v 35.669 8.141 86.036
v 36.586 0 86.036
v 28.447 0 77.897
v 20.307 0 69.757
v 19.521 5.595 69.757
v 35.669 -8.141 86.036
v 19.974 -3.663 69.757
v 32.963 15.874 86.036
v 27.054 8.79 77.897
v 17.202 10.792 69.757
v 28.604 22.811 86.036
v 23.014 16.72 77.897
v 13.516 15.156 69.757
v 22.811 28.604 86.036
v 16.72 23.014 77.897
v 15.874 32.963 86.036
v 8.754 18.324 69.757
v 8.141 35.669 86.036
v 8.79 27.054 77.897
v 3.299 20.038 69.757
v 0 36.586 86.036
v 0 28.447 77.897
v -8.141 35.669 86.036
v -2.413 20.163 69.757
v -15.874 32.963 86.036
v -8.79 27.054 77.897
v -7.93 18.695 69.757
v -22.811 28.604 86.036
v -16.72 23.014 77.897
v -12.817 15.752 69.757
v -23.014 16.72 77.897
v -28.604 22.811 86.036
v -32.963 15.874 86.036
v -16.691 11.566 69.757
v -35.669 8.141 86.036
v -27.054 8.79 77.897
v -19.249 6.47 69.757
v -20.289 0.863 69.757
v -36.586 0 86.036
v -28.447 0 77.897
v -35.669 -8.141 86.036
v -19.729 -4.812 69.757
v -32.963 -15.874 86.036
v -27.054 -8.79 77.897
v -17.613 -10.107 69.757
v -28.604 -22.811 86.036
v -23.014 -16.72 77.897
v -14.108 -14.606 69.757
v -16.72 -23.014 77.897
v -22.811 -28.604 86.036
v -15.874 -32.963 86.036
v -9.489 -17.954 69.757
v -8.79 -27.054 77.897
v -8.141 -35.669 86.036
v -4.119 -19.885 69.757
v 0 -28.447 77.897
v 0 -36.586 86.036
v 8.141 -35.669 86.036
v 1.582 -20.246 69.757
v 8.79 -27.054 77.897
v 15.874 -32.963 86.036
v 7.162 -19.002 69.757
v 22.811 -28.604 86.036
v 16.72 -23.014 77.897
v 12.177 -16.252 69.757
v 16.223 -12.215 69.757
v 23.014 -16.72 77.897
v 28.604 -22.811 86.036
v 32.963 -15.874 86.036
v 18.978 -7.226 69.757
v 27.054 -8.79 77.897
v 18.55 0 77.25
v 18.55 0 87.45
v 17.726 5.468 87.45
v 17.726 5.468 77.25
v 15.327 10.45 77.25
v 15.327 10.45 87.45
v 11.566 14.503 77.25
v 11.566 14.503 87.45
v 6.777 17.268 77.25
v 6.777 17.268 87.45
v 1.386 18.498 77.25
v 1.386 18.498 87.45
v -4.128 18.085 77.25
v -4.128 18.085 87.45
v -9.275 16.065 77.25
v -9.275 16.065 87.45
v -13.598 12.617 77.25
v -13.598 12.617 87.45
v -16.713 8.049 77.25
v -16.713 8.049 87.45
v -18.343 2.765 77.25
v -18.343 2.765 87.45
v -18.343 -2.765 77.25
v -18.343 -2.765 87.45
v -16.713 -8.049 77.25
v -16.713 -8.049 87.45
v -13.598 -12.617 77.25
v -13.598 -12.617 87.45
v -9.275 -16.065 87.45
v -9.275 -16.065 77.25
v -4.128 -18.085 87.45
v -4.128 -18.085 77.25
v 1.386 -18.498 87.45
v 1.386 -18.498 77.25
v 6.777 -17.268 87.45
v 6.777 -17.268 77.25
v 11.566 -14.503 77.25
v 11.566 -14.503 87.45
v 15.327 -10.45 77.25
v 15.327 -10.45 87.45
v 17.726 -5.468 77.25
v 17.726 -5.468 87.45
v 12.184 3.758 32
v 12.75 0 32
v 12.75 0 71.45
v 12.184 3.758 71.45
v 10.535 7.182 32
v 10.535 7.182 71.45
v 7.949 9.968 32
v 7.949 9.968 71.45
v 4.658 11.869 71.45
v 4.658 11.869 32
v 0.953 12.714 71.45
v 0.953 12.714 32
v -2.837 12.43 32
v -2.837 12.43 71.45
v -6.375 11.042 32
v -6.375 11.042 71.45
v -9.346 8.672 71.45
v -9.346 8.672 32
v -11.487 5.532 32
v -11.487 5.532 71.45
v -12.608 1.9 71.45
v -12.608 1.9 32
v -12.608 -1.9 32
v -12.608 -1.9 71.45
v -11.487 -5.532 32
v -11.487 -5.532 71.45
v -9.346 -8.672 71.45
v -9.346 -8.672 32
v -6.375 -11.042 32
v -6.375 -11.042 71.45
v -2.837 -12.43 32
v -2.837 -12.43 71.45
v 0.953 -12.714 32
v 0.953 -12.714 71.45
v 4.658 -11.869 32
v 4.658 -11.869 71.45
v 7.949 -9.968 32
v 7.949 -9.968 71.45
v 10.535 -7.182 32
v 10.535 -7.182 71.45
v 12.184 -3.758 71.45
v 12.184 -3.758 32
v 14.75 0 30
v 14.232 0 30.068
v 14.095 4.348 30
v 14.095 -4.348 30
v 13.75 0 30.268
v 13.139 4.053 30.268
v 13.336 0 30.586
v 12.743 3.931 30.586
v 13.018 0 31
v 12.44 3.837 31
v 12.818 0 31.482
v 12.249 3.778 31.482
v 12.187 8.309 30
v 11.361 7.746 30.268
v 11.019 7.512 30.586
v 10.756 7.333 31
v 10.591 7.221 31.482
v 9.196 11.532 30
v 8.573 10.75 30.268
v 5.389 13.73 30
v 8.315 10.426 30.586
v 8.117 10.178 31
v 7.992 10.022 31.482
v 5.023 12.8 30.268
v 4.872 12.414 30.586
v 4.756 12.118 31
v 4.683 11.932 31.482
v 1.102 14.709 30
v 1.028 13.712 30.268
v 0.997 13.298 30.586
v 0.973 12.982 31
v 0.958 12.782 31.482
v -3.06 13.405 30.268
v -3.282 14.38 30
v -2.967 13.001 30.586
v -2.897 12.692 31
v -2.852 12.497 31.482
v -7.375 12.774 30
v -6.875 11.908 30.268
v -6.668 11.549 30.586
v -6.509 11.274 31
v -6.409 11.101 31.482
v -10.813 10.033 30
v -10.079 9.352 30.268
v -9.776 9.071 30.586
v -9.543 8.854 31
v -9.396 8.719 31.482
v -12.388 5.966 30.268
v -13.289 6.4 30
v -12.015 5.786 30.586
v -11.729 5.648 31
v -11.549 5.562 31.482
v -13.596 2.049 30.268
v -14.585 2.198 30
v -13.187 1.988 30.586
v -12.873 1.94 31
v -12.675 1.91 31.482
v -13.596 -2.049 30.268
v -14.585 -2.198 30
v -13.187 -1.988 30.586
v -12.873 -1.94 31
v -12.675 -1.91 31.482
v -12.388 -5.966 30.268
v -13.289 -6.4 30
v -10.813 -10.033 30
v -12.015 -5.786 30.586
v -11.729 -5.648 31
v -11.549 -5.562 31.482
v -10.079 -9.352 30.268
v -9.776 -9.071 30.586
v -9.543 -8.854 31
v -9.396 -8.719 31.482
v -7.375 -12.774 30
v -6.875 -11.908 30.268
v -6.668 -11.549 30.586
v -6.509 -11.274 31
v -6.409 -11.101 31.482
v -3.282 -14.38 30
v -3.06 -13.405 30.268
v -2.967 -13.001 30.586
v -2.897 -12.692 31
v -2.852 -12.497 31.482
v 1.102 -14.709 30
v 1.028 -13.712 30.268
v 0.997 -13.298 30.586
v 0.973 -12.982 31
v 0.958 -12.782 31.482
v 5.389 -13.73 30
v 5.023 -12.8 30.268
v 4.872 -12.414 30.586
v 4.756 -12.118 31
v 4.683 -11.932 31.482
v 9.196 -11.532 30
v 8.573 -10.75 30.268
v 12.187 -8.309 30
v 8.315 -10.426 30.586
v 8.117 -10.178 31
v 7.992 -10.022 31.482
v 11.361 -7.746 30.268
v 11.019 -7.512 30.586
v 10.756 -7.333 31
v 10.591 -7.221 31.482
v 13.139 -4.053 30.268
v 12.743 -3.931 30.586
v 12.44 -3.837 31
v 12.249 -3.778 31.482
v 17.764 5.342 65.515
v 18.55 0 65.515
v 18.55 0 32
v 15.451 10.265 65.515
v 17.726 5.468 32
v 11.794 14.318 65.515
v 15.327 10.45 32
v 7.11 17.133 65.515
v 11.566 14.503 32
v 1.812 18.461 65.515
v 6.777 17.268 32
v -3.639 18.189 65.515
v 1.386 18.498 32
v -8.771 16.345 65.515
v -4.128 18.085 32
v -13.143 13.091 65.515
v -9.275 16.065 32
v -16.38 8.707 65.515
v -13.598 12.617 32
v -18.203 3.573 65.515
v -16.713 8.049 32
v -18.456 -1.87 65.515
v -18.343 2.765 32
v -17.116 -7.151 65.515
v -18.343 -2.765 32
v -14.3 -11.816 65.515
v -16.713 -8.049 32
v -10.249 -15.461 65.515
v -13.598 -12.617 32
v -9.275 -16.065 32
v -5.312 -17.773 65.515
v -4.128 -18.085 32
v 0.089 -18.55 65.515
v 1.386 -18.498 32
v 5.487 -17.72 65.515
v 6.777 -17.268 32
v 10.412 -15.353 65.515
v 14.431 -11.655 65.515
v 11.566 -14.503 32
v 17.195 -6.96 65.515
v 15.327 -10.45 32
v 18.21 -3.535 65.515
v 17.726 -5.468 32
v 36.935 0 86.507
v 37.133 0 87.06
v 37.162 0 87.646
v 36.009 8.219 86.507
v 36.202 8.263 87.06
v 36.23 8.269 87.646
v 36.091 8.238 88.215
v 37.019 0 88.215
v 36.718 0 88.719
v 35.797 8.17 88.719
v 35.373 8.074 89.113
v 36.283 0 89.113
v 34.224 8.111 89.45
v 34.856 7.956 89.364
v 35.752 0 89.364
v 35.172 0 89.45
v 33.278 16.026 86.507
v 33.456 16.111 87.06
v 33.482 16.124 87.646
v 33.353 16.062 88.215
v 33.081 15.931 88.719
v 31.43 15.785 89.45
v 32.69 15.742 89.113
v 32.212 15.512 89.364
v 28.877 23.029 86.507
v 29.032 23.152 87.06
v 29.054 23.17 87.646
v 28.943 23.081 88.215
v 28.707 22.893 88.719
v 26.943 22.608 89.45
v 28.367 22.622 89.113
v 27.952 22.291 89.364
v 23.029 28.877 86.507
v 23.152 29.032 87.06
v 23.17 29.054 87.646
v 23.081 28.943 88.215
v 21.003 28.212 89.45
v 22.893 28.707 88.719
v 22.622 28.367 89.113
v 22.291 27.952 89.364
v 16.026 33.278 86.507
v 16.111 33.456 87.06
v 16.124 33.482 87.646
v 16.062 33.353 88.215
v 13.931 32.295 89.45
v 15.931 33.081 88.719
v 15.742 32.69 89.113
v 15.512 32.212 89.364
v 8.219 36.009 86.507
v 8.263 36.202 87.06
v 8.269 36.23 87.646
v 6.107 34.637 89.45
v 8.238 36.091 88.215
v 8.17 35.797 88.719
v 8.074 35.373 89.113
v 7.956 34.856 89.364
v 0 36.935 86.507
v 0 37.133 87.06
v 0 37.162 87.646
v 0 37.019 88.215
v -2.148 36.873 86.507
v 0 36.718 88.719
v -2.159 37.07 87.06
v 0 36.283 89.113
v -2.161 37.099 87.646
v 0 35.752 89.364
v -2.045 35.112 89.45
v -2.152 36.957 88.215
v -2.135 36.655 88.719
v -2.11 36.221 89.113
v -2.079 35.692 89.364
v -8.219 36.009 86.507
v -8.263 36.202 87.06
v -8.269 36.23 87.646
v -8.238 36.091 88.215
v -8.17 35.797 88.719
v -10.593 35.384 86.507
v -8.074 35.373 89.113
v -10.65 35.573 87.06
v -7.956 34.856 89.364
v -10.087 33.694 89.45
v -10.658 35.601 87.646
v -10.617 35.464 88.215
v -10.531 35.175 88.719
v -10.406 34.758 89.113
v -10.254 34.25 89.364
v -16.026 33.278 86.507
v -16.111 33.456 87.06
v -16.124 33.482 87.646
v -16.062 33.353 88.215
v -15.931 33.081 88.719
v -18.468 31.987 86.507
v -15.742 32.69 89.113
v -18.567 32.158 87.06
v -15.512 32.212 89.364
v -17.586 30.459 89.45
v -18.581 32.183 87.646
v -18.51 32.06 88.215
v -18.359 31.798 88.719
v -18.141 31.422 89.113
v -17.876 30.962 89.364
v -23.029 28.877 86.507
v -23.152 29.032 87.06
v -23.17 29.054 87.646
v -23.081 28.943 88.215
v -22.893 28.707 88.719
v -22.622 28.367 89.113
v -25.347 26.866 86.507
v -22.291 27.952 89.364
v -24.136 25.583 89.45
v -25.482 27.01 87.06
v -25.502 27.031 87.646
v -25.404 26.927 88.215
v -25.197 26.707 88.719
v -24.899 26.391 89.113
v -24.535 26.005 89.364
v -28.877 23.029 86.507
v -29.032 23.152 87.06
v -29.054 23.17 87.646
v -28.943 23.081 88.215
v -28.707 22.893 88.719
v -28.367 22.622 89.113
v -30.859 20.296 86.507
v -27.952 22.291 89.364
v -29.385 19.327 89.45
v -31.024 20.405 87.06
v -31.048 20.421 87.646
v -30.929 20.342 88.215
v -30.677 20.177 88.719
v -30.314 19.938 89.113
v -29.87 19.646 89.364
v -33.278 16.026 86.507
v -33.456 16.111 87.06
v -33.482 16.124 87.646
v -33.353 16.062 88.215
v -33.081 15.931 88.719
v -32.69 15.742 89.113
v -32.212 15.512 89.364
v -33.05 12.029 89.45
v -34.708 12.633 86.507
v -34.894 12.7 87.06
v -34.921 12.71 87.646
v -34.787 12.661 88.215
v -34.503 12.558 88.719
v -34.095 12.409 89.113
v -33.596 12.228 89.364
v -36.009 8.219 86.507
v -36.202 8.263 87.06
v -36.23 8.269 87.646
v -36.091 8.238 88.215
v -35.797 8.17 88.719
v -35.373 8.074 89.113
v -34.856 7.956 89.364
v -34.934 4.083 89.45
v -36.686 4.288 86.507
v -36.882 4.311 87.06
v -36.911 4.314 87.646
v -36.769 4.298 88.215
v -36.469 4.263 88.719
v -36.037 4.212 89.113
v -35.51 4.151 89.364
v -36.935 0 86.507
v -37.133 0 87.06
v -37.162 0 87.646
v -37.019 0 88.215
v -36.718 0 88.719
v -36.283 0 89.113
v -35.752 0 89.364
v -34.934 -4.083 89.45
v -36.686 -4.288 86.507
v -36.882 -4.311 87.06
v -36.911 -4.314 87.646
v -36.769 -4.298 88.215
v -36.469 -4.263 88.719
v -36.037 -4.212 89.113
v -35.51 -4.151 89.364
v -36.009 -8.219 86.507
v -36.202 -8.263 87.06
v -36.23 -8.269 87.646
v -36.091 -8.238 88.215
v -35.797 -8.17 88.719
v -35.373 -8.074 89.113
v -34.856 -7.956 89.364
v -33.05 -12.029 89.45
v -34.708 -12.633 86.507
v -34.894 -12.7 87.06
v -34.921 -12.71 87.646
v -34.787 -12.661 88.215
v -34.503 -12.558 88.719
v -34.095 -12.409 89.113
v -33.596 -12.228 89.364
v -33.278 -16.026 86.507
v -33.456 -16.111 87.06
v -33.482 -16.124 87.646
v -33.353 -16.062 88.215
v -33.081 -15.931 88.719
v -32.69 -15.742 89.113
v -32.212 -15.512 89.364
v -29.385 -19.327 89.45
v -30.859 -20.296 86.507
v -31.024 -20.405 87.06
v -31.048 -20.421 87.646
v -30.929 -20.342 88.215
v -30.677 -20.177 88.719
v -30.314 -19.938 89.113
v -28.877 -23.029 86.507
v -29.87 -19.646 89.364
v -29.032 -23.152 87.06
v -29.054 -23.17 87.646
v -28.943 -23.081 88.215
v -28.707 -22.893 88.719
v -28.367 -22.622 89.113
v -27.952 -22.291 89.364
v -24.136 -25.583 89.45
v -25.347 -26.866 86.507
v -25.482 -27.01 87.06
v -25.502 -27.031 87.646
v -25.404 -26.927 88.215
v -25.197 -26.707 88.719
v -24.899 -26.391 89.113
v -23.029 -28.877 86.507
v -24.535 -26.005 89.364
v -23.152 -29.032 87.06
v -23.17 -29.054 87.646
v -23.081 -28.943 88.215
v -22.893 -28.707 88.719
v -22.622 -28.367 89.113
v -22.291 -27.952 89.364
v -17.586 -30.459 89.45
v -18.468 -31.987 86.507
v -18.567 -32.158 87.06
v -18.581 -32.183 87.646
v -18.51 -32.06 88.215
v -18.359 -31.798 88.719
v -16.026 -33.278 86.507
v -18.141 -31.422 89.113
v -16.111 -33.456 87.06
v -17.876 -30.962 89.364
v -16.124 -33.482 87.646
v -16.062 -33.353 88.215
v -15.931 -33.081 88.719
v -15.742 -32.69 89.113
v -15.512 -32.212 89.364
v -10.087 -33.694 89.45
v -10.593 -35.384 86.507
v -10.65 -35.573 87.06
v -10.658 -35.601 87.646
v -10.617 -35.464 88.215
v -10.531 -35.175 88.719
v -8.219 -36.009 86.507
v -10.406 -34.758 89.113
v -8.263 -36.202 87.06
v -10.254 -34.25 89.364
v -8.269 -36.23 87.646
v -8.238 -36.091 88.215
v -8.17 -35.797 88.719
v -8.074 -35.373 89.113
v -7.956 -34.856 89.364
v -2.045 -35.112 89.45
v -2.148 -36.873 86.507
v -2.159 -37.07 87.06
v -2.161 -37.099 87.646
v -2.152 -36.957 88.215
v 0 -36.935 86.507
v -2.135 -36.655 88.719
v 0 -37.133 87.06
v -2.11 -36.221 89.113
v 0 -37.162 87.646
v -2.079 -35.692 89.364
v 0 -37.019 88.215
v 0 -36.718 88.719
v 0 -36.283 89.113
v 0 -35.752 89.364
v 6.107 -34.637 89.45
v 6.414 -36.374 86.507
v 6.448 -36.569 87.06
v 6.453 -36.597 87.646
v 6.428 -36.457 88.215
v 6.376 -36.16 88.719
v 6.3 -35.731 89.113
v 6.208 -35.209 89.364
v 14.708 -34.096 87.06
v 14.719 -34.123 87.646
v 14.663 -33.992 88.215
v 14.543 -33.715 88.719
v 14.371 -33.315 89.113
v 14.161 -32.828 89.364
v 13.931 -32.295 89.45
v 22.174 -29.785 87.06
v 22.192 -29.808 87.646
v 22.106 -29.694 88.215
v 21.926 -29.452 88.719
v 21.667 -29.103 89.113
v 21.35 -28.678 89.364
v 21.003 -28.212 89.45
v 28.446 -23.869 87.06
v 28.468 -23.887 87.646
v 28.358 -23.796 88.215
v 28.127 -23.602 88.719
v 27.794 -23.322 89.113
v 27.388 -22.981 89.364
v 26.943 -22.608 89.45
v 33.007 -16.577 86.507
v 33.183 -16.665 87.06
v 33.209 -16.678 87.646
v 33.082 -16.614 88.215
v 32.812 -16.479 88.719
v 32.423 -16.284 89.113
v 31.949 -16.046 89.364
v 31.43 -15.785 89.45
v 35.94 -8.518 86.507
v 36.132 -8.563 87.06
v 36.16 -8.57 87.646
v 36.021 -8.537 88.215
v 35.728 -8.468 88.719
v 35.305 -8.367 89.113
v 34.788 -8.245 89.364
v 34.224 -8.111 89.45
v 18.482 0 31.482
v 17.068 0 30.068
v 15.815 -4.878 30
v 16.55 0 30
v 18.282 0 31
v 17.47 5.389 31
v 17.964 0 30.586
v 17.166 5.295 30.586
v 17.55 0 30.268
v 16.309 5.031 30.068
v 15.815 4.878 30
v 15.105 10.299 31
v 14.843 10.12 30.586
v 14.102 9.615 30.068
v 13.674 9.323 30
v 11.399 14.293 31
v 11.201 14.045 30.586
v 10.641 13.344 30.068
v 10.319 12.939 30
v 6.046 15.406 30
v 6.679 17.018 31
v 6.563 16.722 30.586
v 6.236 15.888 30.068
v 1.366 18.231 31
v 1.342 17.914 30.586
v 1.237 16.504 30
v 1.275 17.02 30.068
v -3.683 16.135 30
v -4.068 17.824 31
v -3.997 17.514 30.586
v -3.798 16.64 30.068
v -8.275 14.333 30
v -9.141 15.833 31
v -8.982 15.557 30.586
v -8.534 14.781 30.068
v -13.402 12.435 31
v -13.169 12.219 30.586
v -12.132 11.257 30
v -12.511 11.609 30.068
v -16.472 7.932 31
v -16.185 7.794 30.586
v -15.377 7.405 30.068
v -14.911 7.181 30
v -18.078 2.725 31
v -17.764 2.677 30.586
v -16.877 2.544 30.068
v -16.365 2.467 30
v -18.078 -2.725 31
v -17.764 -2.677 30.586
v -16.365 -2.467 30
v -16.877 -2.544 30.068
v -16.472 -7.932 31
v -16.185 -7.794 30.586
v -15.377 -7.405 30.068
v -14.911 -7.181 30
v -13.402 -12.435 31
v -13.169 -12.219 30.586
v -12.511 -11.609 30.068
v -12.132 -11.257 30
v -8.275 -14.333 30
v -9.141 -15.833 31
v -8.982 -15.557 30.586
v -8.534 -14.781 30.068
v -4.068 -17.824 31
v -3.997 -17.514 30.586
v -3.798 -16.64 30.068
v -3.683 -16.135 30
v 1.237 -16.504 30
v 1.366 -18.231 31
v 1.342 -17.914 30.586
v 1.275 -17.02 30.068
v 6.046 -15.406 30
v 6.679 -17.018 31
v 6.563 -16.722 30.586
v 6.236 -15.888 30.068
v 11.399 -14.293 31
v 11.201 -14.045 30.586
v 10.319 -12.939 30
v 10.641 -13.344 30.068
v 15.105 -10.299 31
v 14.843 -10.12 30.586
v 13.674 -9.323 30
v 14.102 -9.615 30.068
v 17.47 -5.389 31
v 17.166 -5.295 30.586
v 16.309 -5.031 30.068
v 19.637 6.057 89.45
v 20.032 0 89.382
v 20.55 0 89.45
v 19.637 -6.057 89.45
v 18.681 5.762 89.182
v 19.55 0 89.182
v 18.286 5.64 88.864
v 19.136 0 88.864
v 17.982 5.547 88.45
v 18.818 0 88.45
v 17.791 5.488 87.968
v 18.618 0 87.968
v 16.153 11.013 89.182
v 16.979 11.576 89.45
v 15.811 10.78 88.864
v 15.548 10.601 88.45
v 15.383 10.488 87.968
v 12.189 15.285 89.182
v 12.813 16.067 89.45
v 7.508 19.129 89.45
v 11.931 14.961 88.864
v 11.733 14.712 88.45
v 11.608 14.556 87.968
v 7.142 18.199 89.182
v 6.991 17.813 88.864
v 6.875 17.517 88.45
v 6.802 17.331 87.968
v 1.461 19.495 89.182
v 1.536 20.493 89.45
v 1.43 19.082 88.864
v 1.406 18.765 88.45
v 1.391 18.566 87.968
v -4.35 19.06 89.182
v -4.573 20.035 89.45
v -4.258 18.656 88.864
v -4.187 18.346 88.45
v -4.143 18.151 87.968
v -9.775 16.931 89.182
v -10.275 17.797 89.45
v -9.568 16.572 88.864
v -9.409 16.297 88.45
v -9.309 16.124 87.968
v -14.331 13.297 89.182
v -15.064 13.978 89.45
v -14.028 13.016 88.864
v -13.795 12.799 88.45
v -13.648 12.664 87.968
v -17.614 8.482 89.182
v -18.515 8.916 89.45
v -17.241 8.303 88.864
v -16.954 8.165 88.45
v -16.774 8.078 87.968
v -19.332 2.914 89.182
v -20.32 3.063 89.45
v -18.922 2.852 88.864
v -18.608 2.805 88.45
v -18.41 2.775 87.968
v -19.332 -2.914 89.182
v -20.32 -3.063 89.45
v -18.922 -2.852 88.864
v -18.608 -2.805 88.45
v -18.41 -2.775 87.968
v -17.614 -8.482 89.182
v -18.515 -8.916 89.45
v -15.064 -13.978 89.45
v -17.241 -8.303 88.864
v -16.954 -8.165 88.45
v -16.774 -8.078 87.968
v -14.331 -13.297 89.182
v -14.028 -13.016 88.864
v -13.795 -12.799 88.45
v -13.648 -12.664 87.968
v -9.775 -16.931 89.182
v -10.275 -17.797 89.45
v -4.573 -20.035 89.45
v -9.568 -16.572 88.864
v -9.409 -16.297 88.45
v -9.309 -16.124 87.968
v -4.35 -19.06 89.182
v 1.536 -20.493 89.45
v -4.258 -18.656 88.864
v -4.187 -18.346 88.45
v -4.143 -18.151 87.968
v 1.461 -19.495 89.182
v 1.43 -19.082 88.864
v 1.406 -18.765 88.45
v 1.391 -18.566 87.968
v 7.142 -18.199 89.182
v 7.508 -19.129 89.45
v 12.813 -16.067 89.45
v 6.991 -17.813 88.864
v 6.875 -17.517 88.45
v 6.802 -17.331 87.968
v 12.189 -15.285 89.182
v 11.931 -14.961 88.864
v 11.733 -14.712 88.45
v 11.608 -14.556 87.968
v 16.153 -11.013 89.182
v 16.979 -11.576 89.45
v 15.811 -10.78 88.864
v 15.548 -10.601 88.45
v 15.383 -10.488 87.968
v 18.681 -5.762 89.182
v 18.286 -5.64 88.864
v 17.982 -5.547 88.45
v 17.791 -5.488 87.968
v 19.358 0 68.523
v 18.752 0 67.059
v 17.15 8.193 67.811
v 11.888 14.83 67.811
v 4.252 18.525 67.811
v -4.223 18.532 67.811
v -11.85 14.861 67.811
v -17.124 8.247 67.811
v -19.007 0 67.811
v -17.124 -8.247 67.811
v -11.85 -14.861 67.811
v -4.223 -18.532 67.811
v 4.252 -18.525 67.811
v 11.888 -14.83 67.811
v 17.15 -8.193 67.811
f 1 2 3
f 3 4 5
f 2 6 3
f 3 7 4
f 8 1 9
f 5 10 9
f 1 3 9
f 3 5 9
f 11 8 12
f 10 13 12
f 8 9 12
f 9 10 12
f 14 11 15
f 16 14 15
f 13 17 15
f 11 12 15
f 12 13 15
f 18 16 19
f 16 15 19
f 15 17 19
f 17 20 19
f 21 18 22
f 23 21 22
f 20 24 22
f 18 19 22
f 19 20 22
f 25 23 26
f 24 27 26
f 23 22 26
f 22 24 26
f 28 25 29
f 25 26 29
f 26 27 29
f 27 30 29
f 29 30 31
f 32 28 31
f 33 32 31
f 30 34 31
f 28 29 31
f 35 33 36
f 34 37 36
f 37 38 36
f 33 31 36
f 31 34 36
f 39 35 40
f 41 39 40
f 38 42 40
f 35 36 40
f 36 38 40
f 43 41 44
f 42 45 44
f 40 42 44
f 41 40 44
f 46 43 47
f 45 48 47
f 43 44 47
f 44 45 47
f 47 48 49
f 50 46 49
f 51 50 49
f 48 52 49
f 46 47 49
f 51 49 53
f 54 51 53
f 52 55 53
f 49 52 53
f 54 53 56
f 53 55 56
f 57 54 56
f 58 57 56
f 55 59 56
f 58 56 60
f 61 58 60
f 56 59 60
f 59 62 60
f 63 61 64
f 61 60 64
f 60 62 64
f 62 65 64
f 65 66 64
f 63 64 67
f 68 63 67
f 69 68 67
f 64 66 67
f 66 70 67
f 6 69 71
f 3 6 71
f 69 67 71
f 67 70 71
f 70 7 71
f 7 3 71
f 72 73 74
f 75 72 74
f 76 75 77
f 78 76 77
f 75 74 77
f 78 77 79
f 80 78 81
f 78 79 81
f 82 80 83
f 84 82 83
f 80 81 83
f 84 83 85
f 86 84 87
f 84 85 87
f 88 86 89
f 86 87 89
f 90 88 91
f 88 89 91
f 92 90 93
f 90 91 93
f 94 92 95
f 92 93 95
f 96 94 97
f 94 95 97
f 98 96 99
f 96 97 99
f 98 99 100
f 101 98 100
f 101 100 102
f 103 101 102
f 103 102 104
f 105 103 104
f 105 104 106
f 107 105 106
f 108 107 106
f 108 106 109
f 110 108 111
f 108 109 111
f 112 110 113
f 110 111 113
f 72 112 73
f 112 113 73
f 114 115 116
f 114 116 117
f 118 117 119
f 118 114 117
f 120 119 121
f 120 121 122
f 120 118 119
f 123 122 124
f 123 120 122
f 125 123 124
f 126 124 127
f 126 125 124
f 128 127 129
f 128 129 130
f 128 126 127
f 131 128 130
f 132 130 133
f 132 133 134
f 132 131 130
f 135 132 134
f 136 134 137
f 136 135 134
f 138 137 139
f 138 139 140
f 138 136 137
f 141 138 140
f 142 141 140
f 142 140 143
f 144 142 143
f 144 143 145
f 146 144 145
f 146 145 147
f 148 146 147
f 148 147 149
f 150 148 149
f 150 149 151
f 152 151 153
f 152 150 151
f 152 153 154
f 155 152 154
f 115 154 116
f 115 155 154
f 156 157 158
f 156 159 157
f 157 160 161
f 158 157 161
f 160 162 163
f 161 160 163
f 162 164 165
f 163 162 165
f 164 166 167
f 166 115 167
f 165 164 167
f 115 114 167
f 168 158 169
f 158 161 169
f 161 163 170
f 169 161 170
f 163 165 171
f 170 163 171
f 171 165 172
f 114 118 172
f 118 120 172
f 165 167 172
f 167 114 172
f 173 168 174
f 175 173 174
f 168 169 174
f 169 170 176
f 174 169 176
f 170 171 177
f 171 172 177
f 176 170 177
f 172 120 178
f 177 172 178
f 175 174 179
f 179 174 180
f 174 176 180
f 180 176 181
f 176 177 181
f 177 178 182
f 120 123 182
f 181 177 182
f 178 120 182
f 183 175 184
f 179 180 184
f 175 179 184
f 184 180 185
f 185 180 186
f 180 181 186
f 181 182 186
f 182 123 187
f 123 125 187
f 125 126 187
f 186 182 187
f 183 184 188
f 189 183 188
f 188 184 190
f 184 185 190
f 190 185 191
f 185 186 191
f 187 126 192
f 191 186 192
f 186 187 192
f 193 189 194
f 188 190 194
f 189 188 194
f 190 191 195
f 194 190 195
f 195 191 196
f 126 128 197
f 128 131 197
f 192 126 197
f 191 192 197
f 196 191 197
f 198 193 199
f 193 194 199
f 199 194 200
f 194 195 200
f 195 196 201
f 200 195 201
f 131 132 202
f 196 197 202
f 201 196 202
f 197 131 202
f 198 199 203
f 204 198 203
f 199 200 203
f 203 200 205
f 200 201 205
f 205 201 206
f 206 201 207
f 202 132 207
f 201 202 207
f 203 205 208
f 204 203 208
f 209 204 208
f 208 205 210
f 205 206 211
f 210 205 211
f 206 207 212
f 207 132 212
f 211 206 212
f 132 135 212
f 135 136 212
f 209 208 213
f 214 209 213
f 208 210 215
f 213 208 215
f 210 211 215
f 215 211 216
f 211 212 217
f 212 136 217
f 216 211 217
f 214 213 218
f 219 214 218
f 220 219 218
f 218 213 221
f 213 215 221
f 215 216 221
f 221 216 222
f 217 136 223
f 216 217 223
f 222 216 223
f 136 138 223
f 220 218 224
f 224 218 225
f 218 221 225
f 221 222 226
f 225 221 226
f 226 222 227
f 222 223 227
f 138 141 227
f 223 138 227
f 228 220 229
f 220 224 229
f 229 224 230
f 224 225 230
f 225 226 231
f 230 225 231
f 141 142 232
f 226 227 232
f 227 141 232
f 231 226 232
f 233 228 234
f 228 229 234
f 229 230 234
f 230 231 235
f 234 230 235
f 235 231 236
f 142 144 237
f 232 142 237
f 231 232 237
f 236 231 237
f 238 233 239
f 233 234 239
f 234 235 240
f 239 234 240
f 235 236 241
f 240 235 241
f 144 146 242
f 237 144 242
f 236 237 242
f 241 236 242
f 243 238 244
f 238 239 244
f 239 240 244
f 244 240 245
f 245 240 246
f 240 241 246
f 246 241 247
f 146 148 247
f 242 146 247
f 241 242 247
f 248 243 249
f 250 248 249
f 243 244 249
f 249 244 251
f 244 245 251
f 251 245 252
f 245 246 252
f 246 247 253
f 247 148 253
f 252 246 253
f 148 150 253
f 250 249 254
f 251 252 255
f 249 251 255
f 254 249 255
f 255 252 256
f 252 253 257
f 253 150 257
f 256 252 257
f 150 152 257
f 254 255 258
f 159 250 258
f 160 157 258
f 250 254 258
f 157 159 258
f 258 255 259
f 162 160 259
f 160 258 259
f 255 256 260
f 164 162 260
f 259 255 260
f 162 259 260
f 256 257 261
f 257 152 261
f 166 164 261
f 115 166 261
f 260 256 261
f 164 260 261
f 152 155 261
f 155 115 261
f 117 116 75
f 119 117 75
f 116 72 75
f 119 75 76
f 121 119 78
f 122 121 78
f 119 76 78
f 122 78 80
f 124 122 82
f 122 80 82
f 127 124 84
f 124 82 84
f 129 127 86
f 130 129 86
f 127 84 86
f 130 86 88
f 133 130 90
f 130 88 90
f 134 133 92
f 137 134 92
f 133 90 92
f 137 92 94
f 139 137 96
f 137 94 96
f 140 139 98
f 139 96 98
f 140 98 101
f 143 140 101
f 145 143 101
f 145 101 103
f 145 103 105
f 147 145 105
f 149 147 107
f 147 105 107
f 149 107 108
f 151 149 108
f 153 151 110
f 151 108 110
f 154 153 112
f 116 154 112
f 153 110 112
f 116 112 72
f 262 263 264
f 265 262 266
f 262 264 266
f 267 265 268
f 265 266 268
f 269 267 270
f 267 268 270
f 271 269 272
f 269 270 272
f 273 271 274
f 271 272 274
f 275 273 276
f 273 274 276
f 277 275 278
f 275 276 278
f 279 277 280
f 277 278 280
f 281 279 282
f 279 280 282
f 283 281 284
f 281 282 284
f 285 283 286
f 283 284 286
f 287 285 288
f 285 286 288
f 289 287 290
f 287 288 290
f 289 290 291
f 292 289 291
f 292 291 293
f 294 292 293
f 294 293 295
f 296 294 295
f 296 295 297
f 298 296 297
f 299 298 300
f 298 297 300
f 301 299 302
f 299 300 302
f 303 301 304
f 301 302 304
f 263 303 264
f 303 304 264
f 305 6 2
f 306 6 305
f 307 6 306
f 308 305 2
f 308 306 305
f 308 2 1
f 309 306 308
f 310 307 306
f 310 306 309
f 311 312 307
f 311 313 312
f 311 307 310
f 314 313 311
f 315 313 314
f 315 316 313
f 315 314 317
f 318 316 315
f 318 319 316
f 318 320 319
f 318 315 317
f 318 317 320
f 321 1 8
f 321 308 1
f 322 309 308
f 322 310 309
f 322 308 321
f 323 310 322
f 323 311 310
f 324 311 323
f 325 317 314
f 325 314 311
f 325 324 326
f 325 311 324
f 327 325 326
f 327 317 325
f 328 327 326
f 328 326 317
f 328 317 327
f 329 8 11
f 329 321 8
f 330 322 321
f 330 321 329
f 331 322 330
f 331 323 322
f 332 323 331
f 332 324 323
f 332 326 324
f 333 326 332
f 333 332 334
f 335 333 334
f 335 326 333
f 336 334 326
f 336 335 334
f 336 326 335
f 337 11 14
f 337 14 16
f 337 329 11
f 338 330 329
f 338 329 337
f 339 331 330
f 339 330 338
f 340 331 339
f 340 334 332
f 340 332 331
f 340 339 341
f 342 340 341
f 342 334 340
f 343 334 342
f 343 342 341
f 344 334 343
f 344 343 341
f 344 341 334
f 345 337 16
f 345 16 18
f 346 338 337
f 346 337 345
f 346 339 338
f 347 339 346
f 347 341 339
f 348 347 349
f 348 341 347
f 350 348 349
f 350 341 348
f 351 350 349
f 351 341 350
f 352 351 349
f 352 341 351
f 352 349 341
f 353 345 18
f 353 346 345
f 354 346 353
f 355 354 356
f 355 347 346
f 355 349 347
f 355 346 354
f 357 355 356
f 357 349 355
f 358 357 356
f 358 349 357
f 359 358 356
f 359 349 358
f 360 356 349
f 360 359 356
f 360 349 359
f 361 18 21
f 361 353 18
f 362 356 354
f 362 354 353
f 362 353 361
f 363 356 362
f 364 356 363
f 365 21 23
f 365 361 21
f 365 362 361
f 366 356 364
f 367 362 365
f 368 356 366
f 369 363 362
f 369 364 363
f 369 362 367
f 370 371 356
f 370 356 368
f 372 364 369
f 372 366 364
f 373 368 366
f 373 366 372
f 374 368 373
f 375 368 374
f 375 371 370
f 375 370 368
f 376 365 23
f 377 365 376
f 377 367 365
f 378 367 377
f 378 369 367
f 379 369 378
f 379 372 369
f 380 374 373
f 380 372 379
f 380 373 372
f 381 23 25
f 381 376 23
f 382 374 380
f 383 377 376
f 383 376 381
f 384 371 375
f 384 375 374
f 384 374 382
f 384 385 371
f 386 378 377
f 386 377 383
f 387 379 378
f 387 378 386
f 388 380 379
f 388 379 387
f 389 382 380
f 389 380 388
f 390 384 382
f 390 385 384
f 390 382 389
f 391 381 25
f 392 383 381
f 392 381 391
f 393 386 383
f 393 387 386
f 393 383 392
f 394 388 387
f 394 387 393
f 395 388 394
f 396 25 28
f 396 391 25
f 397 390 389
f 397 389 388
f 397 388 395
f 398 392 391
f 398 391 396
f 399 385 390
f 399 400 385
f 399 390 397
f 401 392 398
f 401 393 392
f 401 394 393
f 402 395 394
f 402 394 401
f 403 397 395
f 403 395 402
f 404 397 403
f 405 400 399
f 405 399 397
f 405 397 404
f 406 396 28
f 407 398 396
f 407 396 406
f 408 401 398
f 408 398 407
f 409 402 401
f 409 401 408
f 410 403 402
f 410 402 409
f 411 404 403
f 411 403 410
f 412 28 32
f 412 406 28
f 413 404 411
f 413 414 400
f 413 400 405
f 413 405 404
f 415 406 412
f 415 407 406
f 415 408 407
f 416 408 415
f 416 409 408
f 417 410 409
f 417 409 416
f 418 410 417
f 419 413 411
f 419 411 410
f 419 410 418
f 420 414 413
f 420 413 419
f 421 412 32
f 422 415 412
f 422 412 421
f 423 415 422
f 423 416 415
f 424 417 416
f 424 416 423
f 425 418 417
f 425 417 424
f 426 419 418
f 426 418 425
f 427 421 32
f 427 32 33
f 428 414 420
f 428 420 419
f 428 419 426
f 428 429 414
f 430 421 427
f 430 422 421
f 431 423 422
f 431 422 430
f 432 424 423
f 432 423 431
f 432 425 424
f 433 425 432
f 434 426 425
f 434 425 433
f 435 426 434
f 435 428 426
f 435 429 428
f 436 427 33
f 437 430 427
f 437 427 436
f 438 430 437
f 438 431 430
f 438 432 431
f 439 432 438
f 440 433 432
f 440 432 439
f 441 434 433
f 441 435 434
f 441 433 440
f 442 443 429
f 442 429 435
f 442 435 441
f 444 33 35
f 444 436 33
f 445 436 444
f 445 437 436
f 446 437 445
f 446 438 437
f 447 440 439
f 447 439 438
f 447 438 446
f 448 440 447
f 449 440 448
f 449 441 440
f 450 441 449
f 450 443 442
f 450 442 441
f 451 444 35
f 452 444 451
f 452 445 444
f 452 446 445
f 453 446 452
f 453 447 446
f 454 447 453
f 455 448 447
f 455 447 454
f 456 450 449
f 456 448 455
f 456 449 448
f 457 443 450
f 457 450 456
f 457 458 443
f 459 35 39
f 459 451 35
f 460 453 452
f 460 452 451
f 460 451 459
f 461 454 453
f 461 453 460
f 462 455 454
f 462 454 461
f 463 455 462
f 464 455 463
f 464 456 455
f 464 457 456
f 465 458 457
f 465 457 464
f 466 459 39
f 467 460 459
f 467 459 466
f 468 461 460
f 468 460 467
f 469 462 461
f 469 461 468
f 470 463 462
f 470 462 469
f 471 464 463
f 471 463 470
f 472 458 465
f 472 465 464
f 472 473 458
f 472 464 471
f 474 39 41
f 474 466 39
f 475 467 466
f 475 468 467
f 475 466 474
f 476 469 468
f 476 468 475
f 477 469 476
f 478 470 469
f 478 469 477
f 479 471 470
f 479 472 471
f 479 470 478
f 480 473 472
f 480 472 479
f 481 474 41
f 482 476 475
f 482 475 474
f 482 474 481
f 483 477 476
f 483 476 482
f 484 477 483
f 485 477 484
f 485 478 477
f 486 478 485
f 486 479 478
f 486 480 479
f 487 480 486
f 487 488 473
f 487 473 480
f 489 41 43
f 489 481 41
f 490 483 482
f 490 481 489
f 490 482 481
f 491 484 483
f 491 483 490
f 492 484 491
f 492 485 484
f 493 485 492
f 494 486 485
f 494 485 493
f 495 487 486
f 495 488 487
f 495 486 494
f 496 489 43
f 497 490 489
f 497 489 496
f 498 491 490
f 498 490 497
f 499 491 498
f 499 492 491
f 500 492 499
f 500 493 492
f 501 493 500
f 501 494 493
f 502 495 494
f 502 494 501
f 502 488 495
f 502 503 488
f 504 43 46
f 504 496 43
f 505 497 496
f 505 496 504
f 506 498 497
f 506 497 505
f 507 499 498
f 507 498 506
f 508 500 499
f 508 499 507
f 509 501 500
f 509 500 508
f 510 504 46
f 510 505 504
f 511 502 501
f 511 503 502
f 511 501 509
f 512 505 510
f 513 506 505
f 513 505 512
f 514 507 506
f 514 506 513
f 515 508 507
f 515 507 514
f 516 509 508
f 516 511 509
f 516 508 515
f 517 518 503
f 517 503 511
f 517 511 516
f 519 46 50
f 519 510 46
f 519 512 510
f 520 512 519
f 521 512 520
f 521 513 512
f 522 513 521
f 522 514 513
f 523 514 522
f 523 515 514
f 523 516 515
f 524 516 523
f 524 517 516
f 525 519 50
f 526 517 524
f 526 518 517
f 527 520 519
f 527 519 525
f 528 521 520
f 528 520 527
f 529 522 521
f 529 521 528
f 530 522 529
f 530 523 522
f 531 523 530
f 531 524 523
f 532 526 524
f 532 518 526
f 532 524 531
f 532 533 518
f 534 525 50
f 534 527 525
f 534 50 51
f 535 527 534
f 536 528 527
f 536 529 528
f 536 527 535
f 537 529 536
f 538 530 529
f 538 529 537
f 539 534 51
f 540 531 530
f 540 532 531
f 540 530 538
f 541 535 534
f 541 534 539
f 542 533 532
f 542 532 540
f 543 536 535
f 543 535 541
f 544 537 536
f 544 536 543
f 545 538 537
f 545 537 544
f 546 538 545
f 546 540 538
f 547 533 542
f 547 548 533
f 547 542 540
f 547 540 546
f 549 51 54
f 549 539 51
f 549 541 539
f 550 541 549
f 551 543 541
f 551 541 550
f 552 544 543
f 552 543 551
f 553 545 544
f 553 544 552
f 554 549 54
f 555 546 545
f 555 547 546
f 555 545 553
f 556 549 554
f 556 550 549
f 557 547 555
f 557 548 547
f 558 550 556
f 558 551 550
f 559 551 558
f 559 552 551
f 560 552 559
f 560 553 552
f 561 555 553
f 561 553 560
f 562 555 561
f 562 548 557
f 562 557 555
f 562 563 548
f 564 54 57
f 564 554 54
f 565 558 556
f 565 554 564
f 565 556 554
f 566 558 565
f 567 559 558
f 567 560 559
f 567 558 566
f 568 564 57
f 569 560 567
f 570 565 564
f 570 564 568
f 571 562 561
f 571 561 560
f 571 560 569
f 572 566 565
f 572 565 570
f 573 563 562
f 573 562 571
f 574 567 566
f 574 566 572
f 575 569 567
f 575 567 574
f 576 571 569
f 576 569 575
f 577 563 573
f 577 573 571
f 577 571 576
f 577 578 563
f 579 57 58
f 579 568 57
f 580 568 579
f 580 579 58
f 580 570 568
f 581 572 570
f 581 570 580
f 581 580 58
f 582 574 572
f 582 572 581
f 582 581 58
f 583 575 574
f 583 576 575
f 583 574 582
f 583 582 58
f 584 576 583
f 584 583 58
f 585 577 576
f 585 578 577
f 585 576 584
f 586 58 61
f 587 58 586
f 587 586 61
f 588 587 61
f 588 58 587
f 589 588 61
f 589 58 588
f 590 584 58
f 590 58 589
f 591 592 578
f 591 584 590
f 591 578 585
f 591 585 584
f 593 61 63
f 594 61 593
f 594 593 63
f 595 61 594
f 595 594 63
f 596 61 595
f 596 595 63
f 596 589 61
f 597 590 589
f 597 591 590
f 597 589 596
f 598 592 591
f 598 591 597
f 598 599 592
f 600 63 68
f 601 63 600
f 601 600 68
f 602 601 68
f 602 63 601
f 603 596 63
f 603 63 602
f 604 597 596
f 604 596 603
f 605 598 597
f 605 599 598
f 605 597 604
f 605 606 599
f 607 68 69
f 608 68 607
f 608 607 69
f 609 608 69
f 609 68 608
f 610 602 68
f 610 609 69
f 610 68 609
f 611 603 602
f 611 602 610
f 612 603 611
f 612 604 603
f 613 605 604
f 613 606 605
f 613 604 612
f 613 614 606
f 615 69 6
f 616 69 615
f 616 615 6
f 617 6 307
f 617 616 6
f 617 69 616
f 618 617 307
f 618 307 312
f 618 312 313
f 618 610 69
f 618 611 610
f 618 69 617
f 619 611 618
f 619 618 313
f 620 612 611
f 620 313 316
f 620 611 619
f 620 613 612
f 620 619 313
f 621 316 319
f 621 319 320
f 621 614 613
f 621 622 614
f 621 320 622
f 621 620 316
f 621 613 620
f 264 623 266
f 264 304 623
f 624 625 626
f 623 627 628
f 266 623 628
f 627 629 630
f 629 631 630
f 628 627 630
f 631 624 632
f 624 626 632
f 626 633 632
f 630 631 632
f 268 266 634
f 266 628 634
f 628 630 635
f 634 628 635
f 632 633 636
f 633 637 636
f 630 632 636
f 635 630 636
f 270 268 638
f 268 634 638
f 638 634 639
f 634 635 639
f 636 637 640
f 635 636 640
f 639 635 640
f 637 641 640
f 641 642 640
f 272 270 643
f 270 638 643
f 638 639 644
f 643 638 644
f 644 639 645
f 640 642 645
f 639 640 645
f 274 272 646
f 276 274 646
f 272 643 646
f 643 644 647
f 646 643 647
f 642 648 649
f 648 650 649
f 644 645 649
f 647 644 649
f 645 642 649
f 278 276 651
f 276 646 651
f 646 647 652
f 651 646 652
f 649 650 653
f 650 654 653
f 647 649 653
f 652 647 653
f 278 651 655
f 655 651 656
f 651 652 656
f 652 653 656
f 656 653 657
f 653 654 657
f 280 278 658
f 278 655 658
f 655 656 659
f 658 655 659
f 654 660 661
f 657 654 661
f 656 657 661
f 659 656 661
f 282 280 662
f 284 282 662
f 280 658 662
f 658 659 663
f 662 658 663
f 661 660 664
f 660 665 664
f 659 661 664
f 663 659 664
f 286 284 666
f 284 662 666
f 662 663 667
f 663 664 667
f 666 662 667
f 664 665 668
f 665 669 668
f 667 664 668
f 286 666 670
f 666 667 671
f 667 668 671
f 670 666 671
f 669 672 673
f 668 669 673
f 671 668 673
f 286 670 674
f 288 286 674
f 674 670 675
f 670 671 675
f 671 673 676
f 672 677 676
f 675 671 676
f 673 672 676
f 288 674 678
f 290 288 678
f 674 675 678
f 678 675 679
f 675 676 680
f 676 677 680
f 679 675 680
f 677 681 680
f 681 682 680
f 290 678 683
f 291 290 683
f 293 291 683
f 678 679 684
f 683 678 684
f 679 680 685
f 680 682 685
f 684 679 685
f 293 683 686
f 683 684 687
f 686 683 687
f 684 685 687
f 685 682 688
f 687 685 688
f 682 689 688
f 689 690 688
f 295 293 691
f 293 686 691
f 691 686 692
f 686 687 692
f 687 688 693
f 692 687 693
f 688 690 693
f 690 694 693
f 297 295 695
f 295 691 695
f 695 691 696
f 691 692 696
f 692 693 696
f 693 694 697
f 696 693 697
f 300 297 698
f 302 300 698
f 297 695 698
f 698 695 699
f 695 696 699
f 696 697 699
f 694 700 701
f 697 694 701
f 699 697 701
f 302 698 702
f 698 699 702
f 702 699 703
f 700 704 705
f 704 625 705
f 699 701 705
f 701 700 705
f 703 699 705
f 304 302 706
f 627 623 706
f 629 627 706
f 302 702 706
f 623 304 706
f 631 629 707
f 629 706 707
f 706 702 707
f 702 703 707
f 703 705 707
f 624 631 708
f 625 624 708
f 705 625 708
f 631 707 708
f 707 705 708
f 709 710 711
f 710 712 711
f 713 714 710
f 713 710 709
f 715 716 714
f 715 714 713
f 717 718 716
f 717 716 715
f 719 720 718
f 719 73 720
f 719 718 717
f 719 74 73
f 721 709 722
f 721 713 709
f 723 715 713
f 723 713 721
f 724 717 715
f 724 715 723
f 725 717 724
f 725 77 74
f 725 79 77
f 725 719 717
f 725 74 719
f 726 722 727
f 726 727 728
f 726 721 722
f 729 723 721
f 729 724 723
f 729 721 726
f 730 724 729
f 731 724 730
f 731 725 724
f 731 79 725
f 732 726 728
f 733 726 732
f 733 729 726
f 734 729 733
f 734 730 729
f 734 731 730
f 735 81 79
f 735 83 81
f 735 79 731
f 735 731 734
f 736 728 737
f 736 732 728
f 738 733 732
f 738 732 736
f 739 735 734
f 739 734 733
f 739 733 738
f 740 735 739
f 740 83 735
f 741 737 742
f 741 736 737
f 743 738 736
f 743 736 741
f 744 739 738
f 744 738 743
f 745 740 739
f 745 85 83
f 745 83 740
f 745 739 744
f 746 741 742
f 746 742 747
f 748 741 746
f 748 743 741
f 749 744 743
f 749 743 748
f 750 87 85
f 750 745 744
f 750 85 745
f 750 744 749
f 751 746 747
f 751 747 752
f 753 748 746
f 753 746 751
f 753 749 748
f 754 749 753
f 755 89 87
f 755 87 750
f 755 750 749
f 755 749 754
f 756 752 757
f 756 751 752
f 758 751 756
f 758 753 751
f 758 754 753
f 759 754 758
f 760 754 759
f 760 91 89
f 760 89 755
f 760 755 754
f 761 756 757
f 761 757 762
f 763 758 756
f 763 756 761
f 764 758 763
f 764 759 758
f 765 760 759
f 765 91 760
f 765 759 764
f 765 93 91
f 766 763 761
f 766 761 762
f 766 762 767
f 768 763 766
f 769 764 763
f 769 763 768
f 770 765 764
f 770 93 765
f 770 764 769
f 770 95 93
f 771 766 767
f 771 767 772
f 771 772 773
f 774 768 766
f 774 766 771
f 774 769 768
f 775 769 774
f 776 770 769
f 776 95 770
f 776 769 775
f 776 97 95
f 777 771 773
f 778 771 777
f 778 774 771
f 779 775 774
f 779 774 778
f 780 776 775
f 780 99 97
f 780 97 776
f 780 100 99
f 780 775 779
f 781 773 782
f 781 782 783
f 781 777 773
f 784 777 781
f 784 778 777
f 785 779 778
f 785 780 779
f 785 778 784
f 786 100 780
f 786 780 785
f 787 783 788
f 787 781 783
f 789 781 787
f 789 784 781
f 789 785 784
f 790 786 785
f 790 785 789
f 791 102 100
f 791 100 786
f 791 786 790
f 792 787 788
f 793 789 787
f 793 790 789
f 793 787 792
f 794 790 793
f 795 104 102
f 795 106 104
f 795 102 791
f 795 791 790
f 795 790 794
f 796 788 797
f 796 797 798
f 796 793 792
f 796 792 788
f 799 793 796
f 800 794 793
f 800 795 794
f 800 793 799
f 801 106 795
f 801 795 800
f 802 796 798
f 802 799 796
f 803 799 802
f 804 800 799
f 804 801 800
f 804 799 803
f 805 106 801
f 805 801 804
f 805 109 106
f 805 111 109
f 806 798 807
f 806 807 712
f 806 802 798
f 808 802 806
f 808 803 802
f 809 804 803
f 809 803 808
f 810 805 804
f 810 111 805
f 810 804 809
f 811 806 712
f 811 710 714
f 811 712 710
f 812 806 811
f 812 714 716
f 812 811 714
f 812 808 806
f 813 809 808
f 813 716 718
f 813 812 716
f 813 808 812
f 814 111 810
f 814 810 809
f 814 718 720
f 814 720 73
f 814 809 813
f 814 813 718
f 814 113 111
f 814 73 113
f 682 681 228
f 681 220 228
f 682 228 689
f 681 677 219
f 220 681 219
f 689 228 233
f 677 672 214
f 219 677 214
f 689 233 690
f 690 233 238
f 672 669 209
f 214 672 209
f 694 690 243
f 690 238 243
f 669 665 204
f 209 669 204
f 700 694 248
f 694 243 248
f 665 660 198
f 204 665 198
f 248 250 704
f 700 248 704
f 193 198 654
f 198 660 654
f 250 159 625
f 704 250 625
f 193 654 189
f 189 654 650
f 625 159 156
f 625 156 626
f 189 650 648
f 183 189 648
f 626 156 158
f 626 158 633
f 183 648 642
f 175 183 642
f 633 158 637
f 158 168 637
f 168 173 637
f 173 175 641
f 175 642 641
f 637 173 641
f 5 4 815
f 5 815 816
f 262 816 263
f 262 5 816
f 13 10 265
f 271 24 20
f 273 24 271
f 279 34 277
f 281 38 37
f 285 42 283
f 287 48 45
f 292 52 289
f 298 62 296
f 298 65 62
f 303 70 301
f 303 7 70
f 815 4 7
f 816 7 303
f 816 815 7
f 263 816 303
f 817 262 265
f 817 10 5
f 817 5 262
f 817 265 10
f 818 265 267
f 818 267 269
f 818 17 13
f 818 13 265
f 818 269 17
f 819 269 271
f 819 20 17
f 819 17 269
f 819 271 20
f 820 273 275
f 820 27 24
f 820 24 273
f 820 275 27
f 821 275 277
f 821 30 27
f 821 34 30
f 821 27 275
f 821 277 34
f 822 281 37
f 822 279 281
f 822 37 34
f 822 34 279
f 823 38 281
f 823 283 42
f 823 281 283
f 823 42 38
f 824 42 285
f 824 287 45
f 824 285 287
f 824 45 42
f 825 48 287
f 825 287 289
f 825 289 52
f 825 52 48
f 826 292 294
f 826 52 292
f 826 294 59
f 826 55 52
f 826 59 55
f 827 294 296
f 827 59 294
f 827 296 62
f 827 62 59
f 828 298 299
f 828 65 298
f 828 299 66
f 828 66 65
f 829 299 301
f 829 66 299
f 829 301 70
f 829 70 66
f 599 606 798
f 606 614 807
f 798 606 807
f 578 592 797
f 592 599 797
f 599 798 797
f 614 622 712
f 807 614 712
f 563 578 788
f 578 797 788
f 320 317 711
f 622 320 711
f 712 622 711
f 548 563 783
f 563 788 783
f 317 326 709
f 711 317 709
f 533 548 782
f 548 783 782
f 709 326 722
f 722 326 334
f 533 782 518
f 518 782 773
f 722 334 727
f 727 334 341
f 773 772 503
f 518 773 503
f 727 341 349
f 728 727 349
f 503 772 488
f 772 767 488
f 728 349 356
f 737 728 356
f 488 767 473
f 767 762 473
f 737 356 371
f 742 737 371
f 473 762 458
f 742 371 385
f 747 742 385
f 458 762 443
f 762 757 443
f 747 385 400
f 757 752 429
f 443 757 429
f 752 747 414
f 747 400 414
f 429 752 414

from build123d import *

# Parameters (mm, degrees)
FILLET_R    = 6
FILLET002_R = 2


with BuildPart() as part:
    # Sketch003 → Revolution002 (revolve)
    with BuildSketch(Plane.XZ):
        Polygon((12.75, 30), (12.75, 68), (12.75, 71.45), (18.55, 77.25), (18.55, 89.45), (40, 89.45), (18.55, 68), (18.55, 30), align=None)
    revolve(axis=Axis((0, 0, 0), (0, 0, 1)))

    # Fillet
    fillet_edges = [part.edges().sort_by_distance(p)[0] for p in [
        (-18.55, 0, 68),
    ]]
    fillet(fillet_edges, radius=FILLET_R)

    # Fillet002
    fillet002_edges = [part.edges().sort_by_distance(p)[0] for p in [
        (-18.55, 0, 89.45),
        (-40, 0, 89.45),
        (-12.75, 0, 30),
        (-18.55, 0, 30),
    ]]
    fillet(fillet002_edges, radius=FILLET002_R)


solid = part.part
